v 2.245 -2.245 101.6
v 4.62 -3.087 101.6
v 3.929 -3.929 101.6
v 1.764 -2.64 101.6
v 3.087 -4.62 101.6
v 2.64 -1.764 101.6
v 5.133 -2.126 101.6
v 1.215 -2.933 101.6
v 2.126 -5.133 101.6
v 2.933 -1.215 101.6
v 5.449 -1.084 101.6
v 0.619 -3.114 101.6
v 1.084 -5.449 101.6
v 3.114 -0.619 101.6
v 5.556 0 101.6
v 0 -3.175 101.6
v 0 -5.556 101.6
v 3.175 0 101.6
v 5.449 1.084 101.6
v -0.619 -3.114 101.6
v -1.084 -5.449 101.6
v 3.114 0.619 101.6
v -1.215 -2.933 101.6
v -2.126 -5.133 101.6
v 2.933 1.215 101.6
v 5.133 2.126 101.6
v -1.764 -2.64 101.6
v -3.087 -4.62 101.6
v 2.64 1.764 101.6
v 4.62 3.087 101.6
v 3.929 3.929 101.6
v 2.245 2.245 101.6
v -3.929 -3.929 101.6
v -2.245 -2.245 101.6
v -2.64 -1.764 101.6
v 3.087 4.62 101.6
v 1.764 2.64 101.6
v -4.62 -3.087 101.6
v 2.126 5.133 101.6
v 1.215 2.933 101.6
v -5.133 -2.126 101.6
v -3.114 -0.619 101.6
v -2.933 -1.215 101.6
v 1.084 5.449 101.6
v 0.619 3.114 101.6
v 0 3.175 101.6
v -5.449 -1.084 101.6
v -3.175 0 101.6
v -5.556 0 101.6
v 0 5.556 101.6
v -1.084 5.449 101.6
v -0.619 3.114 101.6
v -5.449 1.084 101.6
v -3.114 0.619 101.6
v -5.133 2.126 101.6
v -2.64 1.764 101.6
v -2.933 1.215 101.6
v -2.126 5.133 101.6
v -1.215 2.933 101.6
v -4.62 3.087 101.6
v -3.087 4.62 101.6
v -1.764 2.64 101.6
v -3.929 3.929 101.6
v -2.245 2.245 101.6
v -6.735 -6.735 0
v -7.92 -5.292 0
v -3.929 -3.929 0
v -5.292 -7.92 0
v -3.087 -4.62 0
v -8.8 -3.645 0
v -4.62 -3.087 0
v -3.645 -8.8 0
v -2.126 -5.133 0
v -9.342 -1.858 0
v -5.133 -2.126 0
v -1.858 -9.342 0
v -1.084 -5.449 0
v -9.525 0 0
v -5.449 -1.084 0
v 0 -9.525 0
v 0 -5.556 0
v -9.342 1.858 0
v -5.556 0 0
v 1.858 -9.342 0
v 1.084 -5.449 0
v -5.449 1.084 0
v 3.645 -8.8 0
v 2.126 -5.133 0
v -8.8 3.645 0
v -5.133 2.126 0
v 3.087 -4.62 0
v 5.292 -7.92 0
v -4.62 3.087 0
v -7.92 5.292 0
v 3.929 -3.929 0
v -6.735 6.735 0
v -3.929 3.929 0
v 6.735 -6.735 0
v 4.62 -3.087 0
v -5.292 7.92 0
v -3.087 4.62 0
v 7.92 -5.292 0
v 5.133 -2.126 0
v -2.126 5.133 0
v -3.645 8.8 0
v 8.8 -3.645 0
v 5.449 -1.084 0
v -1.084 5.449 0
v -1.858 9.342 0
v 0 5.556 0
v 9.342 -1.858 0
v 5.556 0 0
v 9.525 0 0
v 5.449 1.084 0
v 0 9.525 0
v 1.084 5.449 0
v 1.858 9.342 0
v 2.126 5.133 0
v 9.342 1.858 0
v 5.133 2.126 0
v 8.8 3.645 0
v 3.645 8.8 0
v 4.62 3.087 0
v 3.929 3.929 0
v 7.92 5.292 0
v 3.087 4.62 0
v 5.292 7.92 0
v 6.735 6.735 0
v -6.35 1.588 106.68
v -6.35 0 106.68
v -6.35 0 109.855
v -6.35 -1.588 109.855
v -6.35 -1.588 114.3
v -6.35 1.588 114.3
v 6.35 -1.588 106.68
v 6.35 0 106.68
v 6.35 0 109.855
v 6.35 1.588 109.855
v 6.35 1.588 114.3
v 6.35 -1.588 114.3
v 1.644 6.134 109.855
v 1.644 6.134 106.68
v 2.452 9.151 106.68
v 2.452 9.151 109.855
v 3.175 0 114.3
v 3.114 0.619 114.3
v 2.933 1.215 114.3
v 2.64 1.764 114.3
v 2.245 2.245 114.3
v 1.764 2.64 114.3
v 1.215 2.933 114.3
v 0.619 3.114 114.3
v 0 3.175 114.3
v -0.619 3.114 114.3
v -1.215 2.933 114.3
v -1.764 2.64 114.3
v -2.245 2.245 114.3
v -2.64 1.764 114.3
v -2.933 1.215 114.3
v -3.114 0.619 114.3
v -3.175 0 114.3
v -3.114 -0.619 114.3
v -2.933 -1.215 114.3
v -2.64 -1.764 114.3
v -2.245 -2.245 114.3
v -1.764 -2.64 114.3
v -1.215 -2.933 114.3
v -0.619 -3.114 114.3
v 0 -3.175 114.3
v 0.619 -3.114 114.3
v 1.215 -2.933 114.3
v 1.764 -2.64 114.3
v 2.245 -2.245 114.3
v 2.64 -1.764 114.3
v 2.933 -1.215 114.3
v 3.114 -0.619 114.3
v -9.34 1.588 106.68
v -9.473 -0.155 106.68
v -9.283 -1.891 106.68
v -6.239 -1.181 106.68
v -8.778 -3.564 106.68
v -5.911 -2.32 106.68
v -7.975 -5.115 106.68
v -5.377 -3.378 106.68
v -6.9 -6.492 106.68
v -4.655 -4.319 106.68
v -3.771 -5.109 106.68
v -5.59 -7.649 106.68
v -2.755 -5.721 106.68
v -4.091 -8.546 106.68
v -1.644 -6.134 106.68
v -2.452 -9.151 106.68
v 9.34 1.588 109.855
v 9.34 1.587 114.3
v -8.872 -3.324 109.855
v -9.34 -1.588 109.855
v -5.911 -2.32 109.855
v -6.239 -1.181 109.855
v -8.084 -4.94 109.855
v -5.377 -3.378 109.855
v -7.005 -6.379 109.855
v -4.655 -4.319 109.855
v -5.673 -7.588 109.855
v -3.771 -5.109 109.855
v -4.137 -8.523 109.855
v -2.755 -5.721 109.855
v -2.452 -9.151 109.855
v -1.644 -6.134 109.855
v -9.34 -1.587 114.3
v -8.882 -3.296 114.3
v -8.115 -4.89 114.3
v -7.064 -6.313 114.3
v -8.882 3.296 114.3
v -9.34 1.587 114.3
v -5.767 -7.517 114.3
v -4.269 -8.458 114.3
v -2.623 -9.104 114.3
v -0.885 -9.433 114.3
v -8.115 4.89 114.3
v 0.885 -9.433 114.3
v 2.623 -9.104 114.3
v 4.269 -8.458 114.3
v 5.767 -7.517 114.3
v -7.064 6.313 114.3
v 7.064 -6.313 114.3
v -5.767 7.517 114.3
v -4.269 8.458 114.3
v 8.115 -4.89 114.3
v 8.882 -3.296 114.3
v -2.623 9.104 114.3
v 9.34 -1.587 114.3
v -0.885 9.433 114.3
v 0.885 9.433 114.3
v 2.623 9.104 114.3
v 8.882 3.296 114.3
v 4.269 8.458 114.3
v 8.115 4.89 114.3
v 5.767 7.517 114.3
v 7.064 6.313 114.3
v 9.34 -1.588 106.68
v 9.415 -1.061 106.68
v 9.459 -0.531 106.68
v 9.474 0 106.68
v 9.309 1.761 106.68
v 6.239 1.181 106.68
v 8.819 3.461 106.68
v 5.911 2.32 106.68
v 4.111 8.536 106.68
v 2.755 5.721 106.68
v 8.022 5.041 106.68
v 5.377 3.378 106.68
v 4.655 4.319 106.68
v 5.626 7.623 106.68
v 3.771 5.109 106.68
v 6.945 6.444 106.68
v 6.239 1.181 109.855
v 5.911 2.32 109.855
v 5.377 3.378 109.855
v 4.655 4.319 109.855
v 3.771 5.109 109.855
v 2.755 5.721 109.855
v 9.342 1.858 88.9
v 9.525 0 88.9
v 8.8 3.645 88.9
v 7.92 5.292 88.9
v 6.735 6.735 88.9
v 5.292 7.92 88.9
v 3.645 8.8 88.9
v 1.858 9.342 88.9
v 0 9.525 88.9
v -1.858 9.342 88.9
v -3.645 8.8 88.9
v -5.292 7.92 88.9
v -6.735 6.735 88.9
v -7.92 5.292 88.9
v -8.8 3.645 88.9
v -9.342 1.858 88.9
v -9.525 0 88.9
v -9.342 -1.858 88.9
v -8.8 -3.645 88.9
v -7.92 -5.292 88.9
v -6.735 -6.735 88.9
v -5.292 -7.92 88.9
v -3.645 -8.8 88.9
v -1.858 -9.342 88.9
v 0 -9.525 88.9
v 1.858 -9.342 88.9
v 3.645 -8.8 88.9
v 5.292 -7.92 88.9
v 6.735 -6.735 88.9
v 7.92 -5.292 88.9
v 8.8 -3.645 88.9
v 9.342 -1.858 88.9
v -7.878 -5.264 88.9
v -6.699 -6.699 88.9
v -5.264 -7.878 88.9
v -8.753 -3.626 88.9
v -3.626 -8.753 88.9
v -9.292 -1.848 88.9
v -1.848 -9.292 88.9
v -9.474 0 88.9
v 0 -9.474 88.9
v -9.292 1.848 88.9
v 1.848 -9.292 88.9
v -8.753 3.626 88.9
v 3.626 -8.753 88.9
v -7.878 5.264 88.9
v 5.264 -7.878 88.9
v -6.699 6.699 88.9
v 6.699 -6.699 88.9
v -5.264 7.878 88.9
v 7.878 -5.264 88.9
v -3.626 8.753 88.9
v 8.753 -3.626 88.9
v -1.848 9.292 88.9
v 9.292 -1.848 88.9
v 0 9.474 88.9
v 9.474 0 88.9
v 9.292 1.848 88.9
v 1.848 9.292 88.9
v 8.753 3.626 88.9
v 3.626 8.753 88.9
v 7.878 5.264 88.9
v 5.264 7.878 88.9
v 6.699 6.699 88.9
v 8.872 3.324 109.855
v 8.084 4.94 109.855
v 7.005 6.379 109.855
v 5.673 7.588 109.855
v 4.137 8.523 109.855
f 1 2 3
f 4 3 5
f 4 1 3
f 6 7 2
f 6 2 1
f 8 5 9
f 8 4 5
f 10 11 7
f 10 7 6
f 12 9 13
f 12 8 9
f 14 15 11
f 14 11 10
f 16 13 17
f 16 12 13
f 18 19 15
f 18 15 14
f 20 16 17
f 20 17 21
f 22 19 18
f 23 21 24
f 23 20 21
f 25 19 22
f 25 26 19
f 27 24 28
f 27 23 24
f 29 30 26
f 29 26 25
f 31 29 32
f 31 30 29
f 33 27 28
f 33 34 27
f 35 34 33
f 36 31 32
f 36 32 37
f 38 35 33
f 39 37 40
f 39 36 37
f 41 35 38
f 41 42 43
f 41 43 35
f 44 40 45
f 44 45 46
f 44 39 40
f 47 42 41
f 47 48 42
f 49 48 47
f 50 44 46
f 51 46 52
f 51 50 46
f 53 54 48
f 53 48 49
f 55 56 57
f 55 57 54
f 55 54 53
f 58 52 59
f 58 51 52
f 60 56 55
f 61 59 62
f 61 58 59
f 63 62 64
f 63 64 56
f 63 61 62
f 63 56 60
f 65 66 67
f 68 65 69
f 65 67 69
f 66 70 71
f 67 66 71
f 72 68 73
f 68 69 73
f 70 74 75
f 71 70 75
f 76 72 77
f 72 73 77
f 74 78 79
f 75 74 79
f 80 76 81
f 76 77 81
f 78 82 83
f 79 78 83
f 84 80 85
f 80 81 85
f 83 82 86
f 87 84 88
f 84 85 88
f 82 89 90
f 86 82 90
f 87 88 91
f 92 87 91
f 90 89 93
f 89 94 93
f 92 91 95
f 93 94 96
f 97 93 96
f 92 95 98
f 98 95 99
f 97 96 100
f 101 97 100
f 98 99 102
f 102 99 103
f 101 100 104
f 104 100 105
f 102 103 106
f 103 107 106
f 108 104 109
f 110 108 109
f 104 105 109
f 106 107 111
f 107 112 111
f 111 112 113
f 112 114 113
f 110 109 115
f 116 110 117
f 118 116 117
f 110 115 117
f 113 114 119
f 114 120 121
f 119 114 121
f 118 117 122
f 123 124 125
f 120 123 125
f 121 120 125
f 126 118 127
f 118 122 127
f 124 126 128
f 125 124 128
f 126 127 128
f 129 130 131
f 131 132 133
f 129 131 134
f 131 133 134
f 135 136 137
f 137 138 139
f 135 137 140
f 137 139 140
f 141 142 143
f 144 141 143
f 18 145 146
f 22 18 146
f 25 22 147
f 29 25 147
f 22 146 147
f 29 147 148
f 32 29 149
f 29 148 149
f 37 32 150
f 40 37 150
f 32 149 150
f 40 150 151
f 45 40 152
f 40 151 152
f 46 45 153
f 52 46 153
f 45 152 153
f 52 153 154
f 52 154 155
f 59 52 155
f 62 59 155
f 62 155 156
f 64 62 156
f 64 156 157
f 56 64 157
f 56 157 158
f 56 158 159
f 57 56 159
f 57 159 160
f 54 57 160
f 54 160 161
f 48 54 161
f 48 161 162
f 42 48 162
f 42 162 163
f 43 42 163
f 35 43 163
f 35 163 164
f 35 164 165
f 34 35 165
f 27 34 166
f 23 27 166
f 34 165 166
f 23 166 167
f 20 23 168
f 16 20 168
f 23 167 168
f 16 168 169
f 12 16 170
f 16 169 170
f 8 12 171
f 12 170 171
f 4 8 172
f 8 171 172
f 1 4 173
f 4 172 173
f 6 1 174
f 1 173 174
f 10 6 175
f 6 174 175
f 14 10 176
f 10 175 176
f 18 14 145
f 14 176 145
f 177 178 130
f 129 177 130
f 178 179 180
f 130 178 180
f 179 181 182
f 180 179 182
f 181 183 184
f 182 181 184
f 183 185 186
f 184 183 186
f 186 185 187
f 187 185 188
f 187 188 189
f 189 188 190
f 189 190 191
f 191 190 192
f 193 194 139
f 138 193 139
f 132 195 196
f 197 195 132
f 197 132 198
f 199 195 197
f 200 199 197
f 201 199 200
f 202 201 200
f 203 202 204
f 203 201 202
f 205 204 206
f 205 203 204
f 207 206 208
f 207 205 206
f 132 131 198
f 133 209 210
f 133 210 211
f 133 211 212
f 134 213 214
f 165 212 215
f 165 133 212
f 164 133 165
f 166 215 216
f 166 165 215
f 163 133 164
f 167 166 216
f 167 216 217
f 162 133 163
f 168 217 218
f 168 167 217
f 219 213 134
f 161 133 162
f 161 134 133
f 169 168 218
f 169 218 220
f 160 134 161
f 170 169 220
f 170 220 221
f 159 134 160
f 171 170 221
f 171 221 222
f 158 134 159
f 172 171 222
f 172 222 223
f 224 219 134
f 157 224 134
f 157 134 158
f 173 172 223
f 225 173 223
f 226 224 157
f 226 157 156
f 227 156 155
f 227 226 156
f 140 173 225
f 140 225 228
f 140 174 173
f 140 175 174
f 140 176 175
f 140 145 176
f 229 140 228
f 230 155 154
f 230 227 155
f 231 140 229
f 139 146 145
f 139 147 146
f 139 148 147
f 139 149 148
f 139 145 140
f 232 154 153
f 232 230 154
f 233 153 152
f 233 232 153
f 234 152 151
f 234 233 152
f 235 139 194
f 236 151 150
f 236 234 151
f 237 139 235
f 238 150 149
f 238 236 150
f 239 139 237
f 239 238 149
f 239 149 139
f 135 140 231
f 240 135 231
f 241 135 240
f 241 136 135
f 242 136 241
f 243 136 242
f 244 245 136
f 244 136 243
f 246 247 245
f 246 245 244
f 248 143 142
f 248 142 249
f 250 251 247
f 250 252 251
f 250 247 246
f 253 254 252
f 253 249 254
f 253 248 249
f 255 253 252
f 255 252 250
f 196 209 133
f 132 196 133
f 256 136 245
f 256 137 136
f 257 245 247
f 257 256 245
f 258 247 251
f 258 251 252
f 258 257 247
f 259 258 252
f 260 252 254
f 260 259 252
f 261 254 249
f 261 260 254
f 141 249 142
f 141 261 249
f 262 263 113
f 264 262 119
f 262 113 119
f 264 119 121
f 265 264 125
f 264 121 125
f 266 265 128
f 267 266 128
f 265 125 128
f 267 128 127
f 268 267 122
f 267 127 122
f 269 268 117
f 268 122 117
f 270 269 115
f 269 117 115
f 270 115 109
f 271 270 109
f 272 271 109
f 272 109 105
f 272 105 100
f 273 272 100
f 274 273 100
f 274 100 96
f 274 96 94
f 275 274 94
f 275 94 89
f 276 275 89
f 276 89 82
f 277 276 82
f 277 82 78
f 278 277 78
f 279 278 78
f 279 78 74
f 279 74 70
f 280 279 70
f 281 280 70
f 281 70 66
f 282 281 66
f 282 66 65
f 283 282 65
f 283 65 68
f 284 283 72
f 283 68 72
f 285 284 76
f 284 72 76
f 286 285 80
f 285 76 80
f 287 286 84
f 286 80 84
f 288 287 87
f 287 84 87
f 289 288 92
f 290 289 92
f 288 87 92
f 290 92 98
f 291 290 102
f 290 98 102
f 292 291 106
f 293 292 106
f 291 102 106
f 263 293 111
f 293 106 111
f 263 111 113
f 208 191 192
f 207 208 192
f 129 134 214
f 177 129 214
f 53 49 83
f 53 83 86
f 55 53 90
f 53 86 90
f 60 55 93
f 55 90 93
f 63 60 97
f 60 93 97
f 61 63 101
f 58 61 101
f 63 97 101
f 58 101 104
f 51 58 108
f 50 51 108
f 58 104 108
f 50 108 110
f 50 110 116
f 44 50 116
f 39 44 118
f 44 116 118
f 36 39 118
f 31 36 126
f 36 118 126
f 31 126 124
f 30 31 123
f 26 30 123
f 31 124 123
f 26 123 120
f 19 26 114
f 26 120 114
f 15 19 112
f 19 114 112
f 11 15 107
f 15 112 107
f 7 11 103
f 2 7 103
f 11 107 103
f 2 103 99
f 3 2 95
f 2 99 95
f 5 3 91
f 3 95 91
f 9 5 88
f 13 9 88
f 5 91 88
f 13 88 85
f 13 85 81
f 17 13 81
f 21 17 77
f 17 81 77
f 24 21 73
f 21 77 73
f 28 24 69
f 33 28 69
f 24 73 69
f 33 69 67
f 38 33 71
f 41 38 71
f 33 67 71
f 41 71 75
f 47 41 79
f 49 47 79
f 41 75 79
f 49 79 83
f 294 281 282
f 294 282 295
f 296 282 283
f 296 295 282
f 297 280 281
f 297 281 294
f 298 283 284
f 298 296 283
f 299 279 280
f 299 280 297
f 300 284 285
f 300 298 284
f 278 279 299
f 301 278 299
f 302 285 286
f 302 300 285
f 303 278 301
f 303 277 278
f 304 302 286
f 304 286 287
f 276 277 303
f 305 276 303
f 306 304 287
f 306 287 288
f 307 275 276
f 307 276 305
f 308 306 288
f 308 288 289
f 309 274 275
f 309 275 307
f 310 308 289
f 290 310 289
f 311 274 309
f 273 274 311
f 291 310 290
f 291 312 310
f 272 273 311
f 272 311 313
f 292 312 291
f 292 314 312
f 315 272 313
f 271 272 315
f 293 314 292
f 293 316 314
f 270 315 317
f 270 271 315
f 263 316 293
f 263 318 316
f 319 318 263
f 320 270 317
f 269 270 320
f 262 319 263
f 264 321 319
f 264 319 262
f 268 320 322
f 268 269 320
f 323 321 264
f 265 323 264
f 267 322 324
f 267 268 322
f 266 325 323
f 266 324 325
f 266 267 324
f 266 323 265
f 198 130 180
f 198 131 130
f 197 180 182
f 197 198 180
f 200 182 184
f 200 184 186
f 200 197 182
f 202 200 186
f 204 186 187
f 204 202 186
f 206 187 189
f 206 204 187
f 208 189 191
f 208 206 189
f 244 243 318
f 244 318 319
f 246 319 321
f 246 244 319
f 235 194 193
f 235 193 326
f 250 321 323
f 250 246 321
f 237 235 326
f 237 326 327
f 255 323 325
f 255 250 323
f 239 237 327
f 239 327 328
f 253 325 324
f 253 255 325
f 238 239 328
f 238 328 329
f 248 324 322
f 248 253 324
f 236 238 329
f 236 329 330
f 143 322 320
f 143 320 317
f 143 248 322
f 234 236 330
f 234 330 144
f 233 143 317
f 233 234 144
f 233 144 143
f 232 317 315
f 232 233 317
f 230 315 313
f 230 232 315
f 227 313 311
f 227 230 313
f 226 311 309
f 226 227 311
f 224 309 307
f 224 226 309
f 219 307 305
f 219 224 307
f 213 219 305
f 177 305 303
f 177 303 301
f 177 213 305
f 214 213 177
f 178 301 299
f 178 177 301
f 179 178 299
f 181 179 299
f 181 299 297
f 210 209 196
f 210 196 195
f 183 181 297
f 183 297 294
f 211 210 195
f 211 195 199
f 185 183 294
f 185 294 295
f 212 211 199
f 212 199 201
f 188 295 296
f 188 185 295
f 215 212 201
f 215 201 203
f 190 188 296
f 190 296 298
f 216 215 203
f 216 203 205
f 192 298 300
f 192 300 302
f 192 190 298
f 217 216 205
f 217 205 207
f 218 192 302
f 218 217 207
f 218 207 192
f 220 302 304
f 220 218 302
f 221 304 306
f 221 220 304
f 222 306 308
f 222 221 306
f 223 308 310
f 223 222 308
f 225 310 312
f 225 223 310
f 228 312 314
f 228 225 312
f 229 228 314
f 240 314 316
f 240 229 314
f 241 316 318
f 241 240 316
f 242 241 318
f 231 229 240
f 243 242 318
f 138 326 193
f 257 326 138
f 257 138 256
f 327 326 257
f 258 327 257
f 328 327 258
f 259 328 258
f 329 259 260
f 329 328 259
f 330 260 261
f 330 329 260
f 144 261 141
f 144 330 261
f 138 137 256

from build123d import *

# Parameters (mm, degrees)
SKETCH1_R           = 9.525
BOSS_EXTRUDE1_DEPTH = 114.3
SKETCH2_R           = 5.55625
CUT_EXTRUDE1_DEPTH  = 101.6
SKETCH3_R           = 3.175
CUT_EXTRUDE2_DEPTH  = 114.3
CUT_EXTRUDE8_DEPTH  = 7.62
CUT_REVOLVE1_ANGLE  = 75
SKETCH8_R           = 9.525
SKETCH8_R_2         = 9.4742
CUT_EXTRUDE10_DEPTH = 25.4


with BuildPart() as part:
    # Sketch1 → Boss-Extrude1 (new body)
    with BuildSketch(Plane.XY):
        Circle(SKETCH1_R)
    extrude(amount=BOSS_EXTRUDE1_DEPTH)

    # Sketch2 → Cut-Extrude1 (cut)
    with BuildSketch(Plane(origin=(0, 0, 0), x_dir=(-1, 0, 0), z_dir=(0, 0, -1))):
        Circle(SKETCH2_R)
    extrude(amount=-CUT_EXTRUDE1_DEPTH, mode=Mode.SUBTRACT)

    # Sketch3 → Cut-Extrude2 (cut)
    with BuildSketch(Plane.XY.offset(114.3)):
        Circle(SKETCH3_R)
    extrude(amount=-CUT_EXTRUDE2_DEPTH, mode=Mode.SUBTRACT)

    # Sketch5 → Cut-Extrude8 (cut)
    with BuildSketch(Plane.XY.offset(114.3)):
        with BuildLine():
            ThreePointArc((9.525, 0), (9.49163573, 0.796540129), (9.391776656, 1.5875))
            Line((9.391776656, 1.5875), (6.35, 1.5875))
            Line((6.35, 1.5875), (6.35, -1.5875))
            Line((6.35, -1.5875), (9.391776656, -1.5875))
            ThreePointArc((9.391776656, -1.5875), (9.49163573, -0.796540129), (9.525, 0))
        make_face()
        with BuildLine():
            Line((-6.35, 1.5875), (-9.391776656, 1.5875))
            ThreePointArc((-9.391776656, 1.5875), (-9.525, 0), (-9.391776656, -1.5875))
            Line((-9.391776656, -1.5875), (-6.35, -1.5875))
            Line((-6.35, -1.5875), (-6.35, 1.5875))
        make_face()
    extrude(amount=-CUT_EXTRUDE8_DEPTH, mode=Mode.SUBTRACT)

    # Sketch7 → Cut-Revolve1 (revolve, cut)
    with BuildSketch(Plane(origin=(0, 0, 0), x_dir=(1, 0, 0), z_dir=(0, 1, 0))):
        Polygon((9.391776656, -106.68), (6.35, -106.68), (6.35, -109.855), (9.525, -109.855), (9.525, -106.68), align=None)
        Polygon((-6.35, -109.855), (-9.525, -109.855), (-9.525, -106.68), (-9.391776656, -106.68), (-6.35, -106.68), align=None)
    revolve(axis=Axis((0, 0, 0), (0, 0, 1)), revolution_arc=CUT_REVOLVE1_ANGLE, mode=Mode.SUBTRACT)

    # Sketch8 → Cut-Extrude10 (cut)
    with BuildSketch(Plane.XY.offset(114.3)):
        Circle(SKETCH8_R)
        Circle(SKETCH8_R_2, mode=Mode.SUBTRACT)
    extrude(amount=-CUT_EXTRUDE10_DEPTH, mode=Mode.SUBTRACT)


solid = part.part
